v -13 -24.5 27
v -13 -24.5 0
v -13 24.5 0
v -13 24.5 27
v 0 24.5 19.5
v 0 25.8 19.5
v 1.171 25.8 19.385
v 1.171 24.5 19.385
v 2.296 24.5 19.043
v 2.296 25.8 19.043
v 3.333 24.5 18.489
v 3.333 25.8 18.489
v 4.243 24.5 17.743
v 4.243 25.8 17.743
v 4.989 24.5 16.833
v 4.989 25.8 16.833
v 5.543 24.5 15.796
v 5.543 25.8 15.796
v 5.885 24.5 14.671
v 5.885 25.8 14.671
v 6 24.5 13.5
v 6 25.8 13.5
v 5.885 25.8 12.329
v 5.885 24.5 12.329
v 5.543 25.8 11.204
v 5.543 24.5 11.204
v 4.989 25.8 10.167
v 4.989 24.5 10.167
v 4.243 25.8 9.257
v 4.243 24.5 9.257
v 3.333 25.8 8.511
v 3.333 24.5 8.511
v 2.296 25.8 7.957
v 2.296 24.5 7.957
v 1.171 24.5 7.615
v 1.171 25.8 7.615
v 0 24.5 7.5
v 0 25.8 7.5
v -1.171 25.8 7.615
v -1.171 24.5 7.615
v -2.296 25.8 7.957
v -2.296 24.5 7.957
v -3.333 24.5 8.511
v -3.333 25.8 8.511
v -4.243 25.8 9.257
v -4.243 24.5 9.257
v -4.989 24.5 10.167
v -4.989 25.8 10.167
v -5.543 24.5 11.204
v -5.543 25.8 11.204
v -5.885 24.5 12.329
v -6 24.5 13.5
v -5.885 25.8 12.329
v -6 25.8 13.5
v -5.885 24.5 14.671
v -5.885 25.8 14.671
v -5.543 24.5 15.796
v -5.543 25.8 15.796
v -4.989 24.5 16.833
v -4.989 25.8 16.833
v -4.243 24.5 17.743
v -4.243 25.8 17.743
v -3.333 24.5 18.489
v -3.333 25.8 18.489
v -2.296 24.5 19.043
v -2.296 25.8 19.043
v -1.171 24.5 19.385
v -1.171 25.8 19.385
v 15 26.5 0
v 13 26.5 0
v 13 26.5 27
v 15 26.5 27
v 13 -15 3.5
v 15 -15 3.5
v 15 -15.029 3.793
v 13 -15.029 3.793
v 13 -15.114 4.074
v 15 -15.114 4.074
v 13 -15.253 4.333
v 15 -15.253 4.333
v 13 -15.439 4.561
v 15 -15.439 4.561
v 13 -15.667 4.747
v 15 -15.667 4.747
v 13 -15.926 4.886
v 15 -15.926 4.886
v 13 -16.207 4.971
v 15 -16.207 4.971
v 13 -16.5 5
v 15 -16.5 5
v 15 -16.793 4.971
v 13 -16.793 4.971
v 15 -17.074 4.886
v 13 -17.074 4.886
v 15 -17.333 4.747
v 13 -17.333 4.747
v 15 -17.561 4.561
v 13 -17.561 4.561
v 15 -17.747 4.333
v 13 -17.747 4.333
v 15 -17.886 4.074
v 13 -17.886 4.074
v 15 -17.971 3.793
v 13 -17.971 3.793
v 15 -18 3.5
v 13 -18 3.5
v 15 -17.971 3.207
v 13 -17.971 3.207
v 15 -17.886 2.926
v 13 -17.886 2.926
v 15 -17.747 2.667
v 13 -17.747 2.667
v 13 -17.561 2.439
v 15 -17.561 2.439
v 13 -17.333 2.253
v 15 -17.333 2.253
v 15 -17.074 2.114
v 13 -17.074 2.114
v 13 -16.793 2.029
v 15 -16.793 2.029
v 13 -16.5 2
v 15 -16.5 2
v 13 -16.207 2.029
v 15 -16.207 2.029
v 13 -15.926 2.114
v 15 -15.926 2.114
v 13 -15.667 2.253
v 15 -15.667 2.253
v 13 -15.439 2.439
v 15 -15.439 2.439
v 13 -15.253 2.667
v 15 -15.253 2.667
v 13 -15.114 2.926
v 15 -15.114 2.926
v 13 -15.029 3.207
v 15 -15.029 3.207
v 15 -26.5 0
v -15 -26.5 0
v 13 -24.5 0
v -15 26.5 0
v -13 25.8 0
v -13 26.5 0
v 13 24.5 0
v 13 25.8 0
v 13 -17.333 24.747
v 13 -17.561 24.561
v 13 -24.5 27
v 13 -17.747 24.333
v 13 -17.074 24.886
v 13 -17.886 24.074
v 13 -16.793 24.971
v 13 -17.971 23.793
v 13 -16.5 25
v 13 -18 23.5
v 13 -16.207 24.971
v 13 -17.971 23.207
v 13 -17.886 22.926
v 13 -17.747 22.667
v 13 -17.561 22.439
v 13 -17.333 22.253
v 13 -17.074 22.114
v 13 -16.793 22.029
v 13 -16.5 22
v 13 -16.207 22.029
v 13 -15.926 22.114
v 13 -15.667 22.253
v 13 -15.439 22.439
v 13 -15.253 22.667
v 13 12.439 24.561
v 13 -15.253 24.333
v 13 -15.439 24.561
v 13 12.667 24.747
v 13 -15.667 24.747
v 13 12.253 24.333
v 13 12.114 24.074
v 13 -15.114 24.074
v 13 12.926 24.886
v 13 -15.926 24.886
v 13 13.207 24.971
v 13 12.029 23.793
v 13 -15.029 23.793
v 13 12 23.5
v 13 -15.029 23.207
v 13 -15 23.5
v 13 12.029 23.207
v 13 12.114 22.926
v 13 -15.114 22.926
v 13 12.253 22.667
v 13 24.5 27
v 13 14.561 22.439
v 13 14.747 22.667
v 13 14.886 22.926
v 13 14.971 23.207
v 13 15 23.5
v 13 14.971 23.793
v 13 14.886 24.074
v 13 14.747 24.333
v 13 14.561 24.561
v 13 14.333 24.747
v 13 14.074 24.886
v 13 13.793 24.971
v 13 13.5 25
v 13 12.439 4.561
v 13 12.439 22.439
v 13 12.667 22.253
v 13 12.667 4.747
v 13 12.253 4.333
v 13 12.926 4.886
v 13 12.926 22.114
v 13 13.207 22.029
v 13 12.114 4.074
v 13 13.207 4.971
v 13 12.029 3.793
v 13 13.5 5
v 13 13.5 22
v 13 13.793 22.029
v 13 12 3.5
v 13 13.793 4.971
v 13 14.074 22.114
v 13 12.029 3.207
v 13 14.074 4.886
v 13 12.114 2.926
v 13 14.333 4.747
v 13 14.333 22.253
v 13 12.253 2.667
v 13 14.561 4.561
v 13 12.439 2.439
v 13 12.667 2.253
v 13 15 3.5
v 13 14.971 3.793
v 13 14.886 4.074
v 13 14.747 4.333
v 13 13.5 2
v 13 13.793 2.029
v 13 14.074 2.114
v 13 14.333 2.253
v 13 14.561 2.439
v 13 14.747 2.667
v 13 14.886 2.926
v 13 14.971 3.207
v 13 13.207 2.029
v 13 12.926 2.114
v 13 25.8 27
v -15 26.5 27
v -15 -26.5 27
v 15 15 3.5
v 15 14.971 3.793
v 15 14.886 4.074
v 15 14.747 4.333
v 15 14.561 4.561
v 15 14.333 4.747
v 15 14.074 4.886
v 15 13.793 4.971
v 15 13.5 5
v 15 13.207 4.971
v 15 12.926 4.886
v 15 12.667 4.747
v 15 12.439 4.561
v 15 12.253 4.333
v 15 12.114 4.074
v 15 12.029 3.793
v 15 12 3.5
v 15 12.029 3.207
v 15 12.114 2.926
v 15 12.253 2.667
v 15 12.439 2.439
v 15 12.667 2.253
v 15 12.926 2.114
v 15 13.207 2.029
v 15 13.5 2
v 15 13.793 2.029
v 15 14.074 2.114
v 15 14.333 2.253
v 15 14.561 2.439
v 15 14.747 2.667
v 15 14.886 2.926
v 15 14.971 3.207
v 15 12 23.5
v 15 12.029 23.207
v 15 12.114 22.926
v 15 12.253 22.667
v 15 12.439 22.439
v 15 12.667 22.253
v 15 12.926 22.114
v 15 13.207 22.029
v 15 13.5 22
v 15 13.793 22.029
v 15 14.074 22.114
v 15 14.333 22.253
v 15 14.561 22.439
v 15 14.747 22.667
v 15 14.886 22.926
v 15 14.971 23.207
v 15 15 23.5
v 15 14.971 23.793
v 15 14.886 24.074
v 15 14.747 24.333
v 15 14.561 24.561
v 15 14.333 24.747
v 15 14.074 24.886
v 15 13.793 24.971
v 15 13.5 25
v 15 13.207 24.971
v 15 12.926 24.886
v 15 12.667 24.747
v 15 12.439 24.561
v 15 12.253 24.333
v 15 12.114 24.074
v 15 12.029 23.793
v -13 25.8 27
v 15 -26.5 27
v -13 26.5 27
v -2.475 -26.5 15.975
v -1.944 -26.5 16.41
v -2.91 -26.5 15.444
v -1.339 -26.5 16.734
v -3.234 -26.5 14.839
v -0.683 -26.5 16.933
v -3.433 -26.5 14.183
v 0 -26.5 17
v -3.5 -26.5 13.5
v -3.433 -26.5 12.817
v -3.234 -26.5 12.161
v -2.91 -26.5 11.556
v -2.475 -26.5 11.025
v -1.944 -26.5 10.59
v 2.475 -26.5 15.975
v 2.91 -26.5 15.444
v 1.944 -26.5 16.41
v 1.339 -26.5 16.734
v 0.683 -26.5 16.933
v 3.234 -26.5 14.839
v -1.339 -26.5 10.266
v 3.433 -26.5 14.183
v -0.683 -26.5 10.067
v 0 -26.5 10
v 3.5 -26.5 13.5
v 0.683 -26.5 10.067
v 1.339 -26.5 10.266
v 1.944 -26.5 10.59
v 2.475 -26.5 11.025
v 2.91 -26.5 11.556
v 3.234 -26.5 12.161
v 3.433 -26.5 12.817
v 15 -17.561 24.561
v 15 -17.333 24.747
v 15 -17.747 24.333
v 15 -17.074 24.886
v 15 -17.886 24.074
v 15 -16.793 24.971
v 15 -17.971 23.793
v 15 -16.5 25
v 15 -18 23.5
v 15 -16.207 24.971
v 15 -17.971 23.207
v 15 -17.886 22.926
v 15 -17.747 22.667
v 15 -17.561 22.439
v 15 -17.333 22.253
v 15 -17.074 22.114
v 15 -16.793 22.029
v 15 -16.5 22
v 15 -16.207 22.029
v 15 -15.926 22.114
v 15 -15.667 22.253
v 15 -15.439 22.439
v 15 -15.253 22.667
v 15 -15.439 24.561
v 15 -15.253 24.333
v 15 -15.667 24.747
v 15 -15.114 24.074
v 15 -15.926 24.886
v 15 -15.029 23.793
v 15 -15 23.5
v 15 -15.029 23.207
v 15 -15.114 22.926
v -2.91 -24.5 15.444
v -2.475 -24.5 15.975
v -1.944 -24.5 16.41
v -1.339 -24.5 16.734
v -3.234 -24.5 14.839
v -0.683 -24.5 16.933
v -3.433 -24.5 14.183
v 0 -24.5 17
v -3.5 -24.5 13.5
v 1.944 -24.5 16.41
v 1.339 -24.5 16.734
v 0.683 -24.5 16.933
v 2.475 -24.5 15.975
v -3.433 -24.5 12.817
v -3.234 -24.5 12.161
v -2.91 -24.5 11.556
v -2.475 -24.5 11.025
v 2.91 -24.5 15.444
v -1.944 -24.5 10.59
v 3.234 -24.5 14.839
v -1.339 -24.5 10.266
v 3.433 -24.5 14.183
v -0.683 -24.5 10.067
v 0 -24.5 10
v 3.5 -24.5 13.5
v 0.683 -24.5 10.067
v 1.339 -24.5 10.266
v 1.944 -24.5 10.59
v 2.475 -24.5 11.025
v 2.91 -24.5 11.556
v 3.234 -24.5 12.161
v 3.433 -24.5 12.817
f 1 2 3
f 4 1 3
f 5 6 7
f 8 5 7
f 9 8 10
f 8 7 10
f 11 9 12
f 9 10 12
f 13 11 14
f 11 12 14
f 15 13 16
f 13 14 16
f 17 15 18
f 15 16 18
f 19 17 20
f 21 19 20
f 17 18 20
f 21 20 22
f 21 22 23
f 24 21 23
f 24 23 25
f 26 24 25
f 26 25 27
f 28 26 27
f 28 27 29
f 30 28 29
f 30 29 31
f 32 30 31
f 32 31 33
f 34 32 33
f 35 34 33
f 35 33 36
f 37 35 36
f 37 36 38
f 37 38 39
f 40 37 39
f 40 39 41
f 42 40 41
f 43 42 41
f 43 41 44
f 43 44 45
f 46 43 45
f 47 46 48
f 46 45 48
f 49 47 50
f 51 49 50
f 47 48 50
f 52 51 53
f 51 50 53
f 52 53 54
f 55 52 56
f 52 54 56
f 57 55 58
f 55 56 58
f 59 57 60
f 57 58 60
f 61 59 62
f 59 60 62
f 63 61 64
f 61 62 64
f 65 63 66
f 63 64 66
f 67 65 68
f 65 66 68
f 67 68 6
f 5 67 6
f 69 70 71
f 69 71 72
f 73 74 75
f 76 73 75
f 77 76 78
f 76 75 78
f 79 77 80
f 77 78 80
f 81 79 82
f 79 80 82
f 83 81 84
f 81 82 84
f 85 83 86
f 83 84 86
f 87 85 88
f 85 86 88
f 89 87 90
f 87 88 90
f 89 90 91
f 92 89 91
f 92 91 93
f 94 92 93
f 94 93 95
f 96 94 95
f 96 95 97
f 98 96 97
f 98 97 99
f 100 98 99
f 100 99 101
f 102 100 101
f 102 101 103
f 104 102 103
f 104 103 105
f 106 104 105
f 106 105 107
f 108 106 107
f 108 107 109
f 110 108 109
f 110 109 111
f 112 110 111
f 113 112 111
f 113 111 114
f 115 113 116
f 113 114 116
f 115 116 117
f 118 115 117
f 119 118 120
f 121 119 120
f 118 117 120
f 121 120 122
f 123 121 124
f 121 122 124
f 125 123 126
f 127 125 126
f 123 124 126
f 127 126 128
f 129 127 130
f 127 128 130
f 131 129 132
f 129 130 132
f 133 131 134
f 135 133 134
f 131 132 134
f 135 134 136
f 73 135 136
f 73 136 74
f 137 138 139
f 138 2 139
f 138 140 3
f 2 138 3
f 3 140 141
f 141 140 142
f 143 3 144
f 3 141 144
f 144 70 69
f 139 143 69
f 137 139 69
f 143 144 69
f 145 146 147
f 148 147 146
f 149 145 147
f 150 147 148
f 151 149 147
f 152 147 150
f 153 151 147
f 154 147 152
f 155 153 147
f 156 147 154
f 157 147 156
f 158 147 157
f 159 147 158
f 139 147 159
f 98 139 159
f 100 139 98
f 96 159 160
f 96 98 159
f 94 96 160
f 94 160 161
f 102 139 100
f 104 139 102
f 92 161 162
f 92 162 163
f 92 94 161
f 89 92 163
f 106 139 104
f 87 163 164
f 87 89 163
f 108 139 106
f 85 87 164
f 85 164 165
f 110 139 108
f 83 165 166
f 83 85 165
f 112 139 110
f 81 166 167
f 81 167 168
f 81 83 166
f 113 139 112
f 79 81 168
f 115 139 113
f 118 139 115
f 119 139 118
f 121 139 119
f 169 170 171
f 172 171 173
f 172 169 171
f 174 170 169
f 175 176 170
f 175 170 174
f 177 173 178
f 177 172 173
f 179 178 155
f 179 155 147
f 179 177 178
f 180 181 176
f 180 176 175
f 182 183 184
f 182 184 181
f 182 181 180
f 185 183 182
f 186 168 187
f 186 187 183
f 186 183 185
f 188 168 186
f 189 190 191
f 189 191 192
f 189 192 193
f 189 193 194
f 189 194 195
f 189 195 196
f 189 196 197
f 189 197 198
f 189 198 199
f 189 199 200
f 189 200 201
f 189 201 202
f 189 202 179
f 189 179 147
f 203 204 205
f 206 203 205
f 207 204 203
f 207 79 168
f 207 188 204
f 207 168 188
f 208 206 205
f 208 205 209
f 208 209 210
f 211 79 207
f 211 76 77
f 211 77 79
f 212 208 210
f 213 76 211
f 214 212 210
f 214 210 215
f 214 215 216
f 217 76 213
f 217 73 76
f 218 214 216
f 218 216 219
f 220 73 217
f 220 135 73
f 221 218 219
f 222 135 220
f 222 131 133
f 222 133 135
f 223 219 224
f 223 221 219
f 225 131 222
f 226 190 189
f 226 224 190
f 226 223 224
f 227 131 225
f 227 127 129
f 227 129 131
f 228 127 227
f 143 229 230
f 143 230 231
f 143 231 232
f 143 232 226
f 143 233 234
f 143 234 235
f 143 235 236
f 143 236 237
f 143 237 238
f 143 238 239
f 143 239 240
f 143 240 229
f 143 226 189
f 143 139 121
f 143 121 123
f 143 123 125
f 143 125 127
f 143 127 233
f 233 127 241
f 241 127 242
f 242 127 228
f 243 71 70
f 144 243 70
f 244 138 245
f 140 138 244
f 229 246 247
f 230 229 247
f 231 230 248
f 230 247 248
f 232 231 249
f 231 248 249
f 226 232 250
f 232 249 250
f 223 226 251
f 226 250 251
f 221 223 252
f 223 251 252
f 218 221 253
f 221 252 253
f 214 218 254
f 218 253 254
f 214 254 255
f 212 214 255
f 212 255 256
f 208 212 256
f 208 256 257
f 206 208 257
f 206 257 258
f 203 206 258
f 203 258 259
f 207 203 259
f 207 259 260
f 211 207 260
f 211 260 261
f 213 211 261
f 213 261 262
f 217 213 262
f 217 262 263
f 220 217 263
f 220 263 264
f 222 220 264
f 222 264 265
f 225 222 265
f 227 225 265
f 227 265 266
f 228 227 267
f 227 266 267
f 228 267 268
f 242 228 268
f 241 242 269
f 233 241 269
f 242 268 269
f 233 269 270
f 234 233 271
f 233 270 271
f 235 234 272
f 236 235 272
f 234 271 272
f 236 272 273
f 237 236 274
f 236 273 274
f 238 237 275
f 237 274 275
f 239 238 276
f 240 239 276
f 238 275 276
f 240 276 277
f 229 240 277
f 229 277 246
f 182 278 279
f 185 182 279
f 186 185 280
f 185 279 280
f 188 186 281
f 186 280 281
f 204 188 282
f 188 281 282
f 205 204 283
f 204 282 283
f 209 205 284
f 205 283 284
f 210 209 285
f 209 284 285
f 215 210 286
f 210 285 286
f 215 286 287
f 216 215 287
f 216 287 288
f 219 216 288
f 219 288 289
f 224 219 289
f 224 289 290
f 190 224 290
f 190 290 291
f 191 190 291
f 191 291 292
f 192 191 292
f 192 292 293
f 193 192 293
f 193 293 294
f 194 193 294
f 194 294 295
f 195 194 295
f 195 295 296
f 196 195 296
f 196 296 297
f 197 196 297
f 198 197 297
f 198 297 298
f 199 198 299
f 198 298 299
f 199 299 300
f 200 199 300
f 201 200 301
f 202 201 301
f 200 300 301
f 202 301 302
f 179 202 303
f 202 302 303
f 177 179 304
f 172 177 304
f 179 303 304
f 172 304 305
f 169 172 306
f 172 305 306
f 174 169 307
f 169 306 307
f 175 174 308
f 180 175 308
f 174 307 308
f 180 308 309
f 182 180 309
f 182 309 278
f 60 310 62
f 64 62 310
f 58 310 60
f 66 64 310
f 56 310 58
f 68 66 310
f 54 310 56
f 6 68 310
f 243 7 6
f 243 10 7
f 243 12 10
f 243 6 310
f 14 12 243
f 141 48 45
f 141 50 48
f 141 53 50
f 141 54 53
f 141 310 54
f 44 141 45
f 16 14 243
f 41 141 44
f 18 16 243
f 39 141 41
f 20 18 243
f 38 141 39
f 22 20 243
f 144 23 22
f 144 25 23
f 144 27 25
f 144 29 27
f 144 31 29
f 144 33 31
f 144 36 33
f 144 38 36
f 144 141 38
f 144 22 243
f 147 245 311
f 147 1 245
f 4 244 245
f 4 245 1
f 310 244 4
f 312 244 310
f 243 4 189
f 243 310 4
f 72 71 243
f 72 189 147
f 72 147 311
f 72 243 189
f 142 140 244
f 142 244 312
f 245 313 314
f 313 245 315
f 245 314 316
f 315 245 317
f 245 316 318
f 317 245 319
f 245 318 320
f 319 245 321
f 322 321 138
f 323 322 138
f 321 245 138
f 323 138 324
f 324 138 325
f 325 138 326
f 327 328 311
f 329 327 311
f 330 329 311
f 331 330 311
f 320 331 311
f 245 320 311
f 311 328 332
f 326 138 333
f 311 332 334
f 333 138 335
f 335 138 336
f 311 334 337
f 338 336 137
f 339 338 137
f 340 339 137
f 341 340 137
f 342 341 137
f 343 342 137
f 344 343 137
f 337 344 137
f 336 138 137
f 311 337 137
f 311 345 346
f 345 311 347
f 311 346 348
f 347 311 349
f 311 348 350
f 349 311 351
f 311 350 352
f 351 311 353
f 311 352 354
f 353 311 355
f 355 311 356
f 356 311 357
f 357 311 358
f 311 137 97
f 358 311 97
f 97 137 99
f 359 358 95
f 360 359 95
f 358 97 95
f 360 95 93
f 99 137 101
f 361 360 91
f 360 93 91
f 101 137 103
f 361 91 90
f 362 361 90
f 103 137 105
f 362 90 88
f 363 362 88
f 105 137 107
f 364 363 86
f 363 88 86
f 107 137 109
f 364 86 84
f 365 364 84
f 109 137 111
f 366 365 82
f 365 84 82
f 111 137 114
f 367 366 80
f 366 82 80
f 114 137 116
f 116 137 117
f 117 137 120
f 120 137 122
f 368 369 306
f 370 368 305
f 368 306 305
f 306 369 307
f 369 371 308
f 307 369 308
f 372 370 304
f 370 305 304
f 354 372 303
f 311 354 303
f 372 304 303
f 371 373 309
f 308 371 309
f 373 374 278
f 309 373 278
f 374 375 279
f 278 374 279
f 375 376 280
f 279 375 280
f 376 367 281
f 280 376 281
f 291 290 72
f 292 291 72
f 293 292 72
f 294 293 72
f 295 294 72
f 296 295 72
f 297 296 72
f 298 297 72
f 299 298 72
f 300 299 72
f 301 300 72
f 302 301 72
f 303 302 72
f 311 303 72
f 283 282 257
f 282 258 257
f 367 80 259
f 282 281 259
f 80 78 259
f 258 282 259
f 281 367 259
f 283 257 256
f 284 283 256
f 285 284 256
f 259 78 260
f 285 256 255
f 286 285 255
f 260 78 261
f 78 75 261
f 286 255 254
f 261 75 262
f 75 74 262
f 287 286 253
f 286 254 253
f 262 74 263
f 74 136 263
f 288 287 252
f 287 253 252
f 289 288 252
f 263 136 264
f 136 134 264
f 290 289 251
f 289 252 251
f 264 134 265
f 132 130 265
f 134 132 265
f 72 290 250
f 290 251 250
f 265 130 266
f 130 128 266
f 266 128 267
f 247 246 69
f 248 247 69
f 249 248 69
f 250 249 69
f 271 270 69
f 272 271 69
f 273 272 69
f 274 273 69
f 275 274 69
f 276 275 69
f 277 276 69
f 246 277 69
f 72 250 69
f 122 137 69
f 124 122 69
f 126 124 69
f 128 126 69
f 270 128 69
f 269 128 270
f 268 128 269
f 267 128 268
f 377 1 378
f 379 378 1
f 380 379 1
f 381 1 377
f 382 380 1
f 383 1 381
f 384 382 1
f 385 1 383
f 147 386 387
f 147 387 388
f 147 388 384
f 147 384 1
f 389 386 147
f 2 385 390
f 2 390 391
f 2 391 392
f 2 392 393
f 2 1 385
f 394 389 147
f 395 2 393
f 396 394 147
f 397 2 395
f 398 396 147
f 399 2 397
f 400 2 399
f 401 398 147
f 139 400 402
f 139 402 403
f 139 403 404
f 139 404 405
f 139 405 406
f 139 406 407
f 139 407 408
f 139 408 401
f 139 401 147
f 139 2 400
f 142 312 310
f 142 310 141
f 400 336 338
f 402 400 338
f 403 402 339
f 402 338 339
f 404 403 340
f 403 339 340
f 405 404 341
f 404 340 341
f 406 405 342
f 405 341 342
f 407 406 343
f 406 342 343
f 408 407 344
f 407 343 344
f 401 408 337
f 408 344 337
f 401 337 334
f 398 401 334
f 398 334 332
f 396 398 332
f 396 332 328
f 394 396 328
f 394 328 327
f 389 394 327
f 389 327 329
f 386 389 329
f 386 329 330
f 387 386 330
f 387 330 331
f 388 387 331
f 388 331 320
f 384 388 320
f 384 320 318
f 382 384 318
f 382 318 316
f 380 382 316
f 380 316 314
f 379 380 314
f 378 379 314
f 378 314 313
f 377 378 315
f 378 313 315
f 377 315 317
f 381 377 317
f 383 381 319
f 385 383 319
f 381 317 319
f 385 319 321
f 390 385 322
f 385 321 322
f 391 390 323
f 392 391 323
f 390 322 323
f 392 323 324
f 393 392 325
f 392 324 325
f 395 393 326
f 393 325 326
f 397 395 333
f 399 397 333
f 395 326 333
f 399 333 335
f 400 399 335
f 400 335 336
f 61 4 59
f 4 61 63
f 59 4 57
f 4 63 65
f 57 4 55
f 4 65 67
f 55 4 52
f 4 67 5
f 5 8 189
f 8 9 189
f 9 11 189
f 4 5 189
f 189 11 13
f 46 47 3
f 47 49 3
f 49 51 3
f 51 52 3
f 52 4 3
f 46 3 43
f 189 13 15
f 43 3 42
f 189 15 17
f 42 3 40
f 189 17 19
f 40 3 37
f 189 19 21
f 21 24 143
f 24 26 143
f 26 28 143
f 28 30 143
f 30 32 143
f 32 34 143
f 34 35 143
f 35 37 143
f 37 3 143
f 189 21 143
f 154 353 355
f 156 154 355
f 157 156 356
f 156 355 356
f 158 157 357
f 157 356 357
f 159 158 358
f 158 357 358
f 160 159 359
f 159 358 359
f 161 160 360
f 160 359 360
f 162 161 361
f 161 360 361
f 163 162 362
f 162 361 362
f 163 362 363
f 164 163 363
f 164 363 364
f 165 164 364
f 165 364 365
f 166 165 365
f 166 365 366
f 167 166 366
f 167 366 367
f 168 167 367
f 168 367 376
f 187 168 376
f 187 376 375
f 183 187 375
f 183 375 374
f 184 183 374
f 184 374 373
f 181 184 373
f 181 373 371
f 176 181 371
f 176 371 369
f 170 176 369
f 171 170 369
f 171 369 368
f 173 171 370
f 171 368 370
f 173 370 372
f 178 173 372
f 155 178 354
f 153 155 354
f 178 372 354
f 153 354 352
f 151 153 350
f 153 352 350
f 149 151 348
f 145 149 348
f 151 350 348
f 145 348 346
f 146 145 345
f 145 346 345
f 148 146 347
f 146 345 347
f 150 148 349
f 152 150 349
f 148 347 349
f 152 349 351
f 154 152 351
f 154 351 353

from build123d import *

# Parameters (mm, degrees)
SKETCH_2_W          = 30
SKETCH_2_H          = 53
SKETCH_2_W_2        = 26
SKETCH_2_H_2        = 49
EXTRUDE_1_DEPTH     = 27
SKETCH_3_W          = 26
SKETCH_3_H          = 27
CUT_EXTRUDE_1_DEPTH = 0.7
SKETCH_4_R          = 3.5
CUT_EXTRUDE_2_DEPTH = 38
SKETCH_5_R          = 1.5
CUT_EXTRUDE_3_DEPTH = 3
SKETCH_6_R          = 6
CUT_EXTRUDE_4_DEPTH = 3


with BuildPart() as part:
    # 草图2 → 拉伸-薄壁1 (new body)
    with BuildSketch(Plane.XY):
        Rectangle(SKETCH_2_W, SKETCH_2_H)
        Rectangle(SKETCH_2_W_2, SKETCH_2_H_2, mode=Mode.SUBTRACT)
    extrude(amount=EXTRUDE_1_DEPTH)

    # 草图3 → 切除-拉伸1 (cut)
    with BuildSketch(Plane(origin=(0, 26.5, 0), x_dir=(1, 0, 0), z_dir=(0, 1, 0))):
        with Locations((0, -13.5)):
            Rectangle(SKETCH_3_W, SKETCH_3_H)
    extrude(amount=-CUT_EXTRUDE_1_DEPTH, mode=Mode.SUBTRACT)

    # 草图4 → 切除-拉伸2 (cut)
    with BuildSketch(Plane.XZ.offset(26.5)):
        with Locations(Location((0, 13.5, 0), (0, 0, 270))):
            Circle(SKETCH_4_R)
    extrude(amount=-CUT_EXTRUDE_2_DEPTH, mode=Mode.SUBTRACT)

    # 草图5 → 切除-拉伸3 (cut)
    with BuildSketch(Plane(origin=(15, 0, 0), x_dir=(0, 0, -1), z_dir=(1, 0, 0))):
        with Locations(Location((-3.5, -16.5, 0), (0, 0, 90))):
            Circle(SKETCH_5_R)
        with Locations(Location((-3.5, 13.5, 0), (0, 0, 90))):
            Circle(SKETCH_5_R)
        with Locations(Location((-23.5, -16.5, 0), (0, 0, 270))):
            Circle(SKETCH_5_R)
        with Locations(Location((-23.5, 13.5, 0), (0, 0, 270))):
            Circle(SKETCH_5_R)
    extrude(amount=-CUT_EXTRUDE_3_DEPTH, mode=Mode.SUBTRACT)

    # 草图6 → 切除-拉伸4 (cut)
    with BuildSketch(Plane(origin=(0, 25.8, 0), x_dir=(1, 0, 0), z_dir=(0, 1, 0))):
        with Locations(Location((0, -13.5, 0), (0, 0, 270))):
            Circle(SKETCH_6_R)
    extrude(amount=-CUT_EXTRUDE_4_DEPTH, mode=Mode.SUBTRACT)


solid = part.part
